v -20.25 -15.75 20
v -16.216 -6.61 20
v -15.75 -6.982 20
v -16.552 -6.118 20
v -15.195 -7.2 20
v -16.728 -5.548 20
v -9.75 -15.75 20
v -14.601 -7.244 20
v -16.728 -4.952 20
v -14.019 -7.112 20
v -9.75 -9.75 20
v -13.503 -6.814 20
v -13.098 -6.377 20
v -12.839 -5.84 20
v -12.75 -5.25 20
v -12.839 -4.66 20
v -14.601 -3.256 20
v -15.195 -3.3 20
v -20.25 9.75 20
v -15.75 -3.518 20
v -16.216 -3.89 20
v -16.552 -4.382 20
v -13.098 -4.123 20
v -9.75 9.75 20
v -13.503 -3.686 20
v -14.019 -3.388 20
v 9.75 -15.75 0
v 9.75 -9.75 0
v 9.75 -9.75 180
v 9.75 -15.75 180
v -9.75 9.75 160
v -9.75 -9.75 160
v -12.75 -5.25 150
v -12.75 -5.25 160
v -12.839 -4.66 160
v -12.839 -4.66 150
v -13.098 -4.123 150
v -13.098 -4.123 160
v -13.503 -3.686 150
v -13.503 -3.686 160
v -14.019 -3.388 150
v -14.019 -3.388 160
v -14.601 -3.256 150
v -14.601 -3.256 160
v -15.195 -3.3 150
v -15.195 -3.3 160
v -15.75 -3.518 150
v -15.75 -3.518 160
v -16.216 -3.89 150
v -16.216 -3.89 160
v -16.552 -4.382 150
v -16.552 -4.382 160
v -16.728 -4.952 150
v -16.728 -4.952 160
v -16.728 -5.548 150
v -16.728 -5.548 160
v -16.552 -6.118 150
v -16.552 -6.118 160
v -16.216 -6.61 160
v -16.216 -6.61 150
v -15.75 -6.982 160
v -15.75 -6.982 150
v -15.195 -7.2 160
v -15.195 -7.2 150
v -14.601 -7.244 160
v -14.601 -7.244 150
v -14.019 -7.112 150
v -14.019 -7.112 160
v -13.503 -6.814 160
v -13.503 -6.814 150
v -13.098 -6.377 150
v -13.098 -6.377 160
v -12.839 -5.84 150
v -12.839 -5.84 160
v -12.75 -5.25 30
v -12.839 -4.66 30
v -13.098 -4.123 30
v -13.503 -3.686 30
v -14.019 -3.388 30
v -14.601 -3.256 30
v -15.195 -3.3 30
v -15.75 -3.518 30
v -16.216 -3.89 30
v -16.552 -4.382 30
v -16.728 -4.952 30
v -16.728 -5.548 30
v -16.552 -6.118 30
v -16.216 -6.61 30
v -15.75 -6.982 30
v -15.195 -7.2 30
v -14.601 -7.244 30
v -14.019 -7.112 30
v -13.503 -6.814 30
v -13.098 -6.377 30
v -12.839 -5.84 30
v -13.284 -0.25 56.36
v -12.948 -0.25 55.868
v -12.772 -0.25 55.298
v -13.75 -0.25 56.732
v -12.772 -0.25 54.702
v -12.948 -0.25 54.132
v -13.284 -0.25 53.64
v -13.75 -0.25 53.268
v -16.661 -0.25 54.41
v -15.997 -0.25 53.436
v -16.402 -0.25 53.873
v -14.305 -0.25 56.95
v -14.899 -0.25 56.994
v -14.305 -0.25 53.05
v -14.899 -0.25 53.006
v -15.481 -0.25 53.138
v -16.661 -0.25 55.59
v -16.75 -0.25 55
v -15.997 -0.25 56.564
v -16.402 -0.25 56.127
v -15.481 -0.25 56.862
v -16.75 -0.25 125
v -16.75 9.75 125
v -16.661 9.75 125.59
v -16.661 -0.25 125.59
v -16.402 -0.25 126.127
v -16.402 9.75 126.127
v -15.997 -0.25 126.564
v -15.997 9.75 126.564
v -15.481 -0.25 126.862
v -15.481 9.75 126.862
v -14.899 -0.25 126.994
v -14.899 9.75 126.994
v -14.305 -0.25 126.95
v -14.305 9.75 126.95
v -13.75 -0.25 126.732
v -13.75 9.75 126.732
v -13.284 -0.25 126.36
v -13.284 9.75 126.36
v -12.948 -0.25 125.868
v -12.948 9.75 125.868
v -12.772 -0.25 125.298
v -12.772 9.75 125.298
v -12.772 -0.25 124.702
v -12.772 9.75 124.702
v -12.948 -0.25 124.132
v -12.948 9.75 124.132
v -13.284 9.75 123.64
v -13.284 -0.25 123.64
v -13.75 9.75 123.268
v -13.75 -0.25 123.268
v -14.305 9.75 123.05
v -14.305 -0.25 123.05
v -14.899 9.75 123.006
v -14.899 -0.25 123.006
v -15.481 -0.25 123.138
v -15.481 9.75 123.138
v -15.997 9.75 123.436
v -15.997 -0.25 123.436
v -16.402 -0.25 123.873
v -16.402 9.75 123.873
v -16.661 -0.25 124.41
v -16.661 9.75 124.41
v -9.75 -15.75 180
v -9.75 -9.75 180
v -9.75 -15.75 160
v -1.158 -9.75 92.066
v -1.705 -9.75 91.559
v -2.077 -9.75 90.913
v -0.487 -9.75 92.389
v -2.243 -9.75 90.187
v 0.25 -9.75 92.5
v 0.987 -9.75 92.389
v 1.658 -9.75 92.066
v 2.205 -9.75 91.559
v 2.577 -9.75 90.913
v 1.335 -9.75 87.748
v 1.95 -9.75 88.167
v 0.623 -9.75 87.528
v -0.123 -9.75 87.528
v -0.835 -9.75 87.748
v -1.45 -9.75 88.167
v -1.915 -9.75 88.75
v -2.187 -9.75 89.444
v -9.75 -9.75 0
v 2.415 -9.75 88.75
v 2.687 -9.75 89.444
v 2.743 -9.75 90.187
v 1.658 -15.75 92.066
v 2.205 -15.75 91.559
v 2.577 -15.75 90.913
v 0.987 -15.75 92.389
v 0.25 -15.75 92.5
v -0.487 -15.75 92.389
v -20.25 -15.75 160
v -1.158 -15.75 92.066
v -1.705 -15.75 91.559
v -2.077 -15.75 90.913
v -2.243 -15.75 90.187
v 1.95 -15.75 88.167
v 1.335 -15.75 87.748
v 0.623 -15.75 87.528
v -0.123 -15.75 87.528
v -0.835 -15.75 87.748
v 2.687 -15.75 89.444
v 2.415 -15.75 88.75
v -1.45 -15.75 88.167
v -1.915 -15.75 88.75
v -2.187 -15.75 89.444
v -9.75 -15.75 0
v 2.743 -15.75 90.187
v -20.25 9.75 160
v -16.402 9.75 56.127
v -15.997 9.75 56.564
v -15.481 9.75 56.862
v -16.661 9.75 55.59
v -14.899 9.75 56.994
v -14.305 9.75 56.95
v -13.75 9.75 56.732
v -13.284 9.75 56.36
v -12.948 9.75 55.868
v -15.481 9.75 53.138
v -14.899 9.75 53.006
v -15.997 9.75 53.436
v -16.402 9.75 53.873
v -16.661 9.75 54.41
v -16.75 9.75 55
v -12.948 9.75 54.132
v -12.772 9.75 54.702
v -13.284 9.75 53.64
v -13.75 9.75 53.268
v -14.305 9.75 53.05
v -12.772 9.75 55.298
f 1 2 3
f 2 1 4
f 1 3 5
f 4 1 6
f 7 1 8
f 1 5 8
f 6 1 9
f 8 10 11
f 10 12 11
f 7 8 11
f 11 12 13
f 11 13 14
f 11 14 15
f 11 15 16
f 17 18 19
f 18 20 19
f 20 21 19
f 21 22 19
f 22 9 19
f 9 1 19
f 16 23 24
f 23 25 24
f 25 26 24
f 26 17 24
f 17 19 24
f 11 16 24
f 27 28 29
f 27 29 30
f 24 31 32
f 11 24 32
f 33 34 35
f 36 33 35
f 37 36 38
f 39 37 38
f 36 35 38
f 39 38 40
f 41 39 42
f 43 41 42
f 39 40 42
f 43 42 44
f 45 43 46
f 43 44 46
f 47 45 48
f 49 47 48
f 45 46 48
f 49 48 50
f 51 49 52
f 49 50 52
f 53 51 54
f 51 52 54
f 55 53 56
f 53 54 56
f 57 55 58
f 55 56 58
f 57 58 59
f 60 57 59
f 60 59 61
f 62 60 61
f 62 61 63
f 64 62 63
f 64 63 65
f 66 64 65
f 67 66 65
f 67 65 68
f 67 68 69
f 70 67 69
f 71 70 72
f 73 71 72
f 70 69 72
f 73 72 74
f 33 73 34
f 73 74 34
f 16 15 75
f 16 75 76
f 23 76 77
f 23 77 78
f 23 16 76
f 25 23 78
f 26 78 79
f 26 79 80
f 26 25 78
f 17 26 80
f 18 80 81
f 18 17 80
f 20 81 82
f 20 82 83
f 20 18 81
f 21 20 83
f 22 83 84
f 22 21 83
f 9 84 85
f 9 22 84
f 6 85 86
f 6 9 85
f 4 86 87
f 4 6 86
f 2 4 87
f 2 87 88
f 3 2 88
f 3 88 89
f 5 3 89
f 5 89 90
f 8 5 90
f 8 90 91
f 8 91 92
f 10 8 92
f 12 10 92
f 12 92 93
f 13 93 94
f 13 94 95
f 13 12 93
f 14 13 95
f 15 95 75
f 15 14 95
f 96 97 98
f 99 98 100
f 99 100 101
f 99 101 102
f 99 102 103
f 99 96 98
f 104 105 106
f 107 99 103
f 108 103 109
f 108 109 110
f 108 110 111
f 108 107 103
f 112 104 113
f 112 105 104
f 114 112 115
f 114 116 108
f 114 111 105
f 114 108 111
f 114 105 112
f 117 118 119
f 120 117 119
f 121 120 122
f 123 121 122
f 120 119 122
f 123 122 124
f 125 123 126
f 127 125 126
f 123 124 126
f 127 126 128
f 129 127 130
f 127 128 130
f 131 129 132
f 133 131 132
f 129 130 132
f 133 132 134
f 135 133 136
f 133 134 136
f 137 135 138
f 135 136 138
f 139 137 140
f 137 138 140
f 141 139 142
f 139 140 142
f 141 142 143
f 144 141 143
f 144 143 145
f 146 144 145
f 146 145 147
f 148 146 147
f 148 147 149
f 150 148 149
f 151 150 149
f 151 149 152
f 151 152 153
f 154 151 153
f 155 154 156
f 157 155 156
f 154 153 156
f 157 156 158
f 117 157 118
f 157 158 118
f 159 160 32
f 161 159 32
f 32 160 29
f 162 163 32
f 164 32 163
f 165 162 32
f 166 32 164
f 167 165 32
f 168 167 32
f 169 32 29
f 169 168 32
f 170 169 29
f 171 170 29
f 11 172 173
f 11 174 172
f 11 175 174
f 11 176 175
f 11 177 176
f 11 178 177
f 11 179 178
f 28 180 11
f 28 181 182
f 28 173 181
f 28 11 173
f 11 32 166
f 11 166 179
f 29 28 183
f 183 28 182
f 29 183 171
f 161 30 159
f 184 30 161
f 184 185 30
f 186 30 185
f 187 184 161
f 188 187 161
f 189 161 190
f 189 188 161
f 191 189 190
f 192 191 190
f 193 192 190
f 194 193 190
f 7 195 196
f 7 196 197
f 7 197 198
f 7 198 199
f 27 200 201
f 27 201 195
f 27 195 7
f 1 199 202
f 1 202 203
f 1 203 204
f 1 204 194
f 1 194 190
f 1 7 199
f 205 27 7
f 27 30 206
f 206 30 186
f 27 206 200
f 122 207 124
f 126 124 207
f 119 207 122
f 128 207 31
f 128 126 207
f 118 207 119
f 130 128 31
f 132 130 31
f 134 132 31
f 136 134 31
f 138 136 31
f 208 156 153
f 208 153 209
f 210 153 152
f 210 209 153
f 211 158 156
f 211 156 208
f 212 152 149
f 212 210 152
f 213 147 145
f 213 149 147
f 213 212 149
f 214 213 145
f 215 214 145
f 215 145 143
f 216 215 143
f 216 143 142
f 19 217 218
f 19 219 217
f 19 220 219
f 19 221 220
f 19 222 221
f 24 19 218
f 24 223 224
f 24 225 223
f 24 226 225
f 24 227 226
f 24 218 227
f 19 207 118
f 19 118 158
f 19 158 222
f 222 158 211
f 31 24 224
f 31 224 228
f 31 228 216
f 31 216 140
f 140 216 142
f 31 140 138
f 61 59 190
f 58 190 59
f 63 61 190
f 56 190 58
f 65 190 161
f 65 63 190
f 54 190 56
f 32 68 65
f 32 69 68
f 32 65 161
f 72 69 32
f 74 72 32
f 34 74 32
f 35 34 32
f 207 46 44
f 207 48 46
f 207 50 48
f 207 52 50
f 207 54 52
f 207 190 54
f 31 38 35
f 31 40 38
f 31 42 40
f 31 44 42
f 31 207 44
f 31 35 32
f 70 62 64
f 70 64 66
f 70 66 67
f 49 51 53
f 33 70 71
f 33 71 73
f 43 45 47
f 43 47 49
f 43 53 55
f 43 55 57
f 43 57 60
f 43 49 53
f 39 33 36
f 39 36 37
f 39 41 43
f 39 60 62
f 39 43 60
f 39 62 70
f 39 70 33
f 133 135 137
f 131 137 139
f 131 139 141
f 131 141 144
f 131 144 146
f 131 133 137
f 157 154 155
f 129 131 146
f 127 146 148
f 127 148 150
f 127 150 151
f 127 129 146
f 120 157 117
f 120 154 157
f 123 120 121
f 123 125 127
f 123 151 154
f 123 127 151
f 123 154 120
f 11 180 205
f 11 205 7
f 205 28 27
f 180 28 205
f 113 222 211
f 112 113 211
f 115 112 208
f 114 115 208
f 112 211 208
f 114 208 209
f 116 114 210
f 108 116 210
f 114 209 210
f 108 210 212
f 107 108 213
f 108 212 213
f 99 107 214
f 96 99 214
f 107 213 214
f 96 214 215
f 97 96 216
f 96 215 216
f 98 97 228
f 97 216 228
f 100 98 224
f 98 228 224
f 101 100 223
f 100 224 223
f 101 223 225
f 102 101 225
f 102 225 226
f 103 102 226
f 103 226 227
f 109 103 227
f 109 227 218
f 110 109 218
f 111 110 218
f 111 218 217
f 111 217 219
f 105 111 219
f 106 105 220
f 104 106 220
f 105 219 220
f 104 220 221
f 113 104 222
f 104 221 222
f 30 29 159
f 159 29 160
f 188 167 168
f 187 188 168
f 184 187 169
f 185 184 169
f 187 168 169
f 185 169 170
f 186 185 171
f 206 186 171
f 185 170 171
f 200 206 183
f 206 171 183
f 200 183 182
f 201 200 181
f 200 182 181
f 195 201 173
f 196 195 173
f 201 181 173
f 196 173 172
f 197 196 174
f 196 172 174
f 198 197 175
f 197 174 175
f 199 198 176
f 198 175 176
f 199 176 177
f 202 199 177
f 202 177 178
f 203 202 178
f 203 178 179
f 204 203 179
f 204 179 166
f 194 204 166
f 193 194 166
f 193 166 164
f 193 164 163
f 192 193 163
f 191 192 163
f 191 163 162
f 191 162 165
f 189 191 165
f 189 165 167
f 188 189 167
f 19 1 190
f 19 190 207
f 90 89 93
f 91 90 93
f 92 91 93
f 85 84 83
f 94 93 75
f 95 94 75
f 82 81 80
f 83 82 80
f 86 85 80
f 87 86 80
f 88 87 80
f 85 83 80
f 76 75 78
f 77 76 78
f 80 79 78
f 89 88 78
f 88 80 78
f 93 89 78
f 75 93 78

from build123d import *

# Parameters (mm, degrees)
DODANIE_WYCI_GNI_CIE1_DEPTH = 180
SZKIC2_W                    = 10.5
SZKIC2_H                    = 20
WYTNIJ_WYCI_GNI_CIE1_DEPTH  = 183.921602059
SZKIC3_R                    = 2
WYTNIJ_WYCI_GNI_CIE2_DEPTH  = 10
SZKIC4_R                    = 2
WYTNIJ_WYCI_GNI_CIE3_DEPTH  = 10
SZKIC5_R                    = 2.5
WYTNIJ_WYCI_GNI_CIE4_DEPTH  = 10


with BuildPart() as part:
    # Szkic1 → Dodanie-wyciągnięcie1 (new body)
    with BuildSketch(Plane.XY):
        Polygon((9.75, -9.75), (9.75, -15.75), (-20.25, -15.75), (-20.25, 9.75), (-9.75, 9.75), (-9.75, -9.75), align=None)
    extrude(amount=DODANIE_WYCI_GNI_CIE1_DEPTH)

    # Szkic2 → Wytnij-wyciągnięcie1 (cut, through all)
    with BuildSketch(Plane(origin=(0, 9.75, 0), x_dir=(1, 0, 0), z_dir=(0, 1, 0))):
        with Locations((-15, -170)):
            Rectangle(SZKIC2_W, SZKIC2_H)
    wytnij_wyci_gni_cie1 = extrude(amount=-WYTNIJ_WYCI_GNI_CIE1_DEPTH, mode=Mode.SUBTRACT)

    # Lustro1: Wytnij-wyciągnięcie1 across plane
    add(wytnij_wyci_gni_cie1.mirror(Plane.XY.offset(90)), mode=Mode.SUBTRACT)

    # Szkic3 → Wytnij-wyciągnięcie2 (cut)
    with BuildSketch(Plane(origin=(0, 9.75, 0), x_dir=(1, 0, 0), z_dir=(0, 1, 0))):
        with Locations(Location((-14.75, -55, 0), (0, 0, 180))):
            Circle(SZKIC3_R)
        with Locations(Location((-14.75, -125, 0), (0, 0, 180))):
            Circle(SZKIC3_R)
    extrude(amount=-WYTNIJ_WYCI_GNI_CIE2_DEPTH, mode=Mode.SUBTRACT)

    # Szkic4 → Wytnij-wyciągnięcie3 (cut)
    with BuildSketch(Plane.XY.offset(160)):
        with Locations((-14.75, -5.25)):
            Circle(SZKIC4_R)
    wytnij_wyci_gni_cie3 = extrude(amount=-WYTNIJ_WYCI_GNI_CIE3_DEPTH, mode=Mode.SUBTRACT)

    # Lustro2: Wytnij-wyciągnięcie3 across plane
    add(wytnij_wyci_gni_cie3.mirror(Plane.XY.offset(90)), mode=Mode.SUBTRACT)

    # Szkic5 → Wytnij-wyciągnięcie4 (cut)
    with BuildSketch(Plane(origin=(0, -9.75, 0), x_dir=(1, 0, 0), z_dir=(0, 1, 0))):
        with Locations(Location((0.25, -90, 0), (0, 0, 270))):
            Circle(SZKIC5_R)
    extrude(amount=-WYTNIJ_WYCI_GNI_CIE4_DEPTH, mode=Mode.SUBTRACT)


solid = part.part
